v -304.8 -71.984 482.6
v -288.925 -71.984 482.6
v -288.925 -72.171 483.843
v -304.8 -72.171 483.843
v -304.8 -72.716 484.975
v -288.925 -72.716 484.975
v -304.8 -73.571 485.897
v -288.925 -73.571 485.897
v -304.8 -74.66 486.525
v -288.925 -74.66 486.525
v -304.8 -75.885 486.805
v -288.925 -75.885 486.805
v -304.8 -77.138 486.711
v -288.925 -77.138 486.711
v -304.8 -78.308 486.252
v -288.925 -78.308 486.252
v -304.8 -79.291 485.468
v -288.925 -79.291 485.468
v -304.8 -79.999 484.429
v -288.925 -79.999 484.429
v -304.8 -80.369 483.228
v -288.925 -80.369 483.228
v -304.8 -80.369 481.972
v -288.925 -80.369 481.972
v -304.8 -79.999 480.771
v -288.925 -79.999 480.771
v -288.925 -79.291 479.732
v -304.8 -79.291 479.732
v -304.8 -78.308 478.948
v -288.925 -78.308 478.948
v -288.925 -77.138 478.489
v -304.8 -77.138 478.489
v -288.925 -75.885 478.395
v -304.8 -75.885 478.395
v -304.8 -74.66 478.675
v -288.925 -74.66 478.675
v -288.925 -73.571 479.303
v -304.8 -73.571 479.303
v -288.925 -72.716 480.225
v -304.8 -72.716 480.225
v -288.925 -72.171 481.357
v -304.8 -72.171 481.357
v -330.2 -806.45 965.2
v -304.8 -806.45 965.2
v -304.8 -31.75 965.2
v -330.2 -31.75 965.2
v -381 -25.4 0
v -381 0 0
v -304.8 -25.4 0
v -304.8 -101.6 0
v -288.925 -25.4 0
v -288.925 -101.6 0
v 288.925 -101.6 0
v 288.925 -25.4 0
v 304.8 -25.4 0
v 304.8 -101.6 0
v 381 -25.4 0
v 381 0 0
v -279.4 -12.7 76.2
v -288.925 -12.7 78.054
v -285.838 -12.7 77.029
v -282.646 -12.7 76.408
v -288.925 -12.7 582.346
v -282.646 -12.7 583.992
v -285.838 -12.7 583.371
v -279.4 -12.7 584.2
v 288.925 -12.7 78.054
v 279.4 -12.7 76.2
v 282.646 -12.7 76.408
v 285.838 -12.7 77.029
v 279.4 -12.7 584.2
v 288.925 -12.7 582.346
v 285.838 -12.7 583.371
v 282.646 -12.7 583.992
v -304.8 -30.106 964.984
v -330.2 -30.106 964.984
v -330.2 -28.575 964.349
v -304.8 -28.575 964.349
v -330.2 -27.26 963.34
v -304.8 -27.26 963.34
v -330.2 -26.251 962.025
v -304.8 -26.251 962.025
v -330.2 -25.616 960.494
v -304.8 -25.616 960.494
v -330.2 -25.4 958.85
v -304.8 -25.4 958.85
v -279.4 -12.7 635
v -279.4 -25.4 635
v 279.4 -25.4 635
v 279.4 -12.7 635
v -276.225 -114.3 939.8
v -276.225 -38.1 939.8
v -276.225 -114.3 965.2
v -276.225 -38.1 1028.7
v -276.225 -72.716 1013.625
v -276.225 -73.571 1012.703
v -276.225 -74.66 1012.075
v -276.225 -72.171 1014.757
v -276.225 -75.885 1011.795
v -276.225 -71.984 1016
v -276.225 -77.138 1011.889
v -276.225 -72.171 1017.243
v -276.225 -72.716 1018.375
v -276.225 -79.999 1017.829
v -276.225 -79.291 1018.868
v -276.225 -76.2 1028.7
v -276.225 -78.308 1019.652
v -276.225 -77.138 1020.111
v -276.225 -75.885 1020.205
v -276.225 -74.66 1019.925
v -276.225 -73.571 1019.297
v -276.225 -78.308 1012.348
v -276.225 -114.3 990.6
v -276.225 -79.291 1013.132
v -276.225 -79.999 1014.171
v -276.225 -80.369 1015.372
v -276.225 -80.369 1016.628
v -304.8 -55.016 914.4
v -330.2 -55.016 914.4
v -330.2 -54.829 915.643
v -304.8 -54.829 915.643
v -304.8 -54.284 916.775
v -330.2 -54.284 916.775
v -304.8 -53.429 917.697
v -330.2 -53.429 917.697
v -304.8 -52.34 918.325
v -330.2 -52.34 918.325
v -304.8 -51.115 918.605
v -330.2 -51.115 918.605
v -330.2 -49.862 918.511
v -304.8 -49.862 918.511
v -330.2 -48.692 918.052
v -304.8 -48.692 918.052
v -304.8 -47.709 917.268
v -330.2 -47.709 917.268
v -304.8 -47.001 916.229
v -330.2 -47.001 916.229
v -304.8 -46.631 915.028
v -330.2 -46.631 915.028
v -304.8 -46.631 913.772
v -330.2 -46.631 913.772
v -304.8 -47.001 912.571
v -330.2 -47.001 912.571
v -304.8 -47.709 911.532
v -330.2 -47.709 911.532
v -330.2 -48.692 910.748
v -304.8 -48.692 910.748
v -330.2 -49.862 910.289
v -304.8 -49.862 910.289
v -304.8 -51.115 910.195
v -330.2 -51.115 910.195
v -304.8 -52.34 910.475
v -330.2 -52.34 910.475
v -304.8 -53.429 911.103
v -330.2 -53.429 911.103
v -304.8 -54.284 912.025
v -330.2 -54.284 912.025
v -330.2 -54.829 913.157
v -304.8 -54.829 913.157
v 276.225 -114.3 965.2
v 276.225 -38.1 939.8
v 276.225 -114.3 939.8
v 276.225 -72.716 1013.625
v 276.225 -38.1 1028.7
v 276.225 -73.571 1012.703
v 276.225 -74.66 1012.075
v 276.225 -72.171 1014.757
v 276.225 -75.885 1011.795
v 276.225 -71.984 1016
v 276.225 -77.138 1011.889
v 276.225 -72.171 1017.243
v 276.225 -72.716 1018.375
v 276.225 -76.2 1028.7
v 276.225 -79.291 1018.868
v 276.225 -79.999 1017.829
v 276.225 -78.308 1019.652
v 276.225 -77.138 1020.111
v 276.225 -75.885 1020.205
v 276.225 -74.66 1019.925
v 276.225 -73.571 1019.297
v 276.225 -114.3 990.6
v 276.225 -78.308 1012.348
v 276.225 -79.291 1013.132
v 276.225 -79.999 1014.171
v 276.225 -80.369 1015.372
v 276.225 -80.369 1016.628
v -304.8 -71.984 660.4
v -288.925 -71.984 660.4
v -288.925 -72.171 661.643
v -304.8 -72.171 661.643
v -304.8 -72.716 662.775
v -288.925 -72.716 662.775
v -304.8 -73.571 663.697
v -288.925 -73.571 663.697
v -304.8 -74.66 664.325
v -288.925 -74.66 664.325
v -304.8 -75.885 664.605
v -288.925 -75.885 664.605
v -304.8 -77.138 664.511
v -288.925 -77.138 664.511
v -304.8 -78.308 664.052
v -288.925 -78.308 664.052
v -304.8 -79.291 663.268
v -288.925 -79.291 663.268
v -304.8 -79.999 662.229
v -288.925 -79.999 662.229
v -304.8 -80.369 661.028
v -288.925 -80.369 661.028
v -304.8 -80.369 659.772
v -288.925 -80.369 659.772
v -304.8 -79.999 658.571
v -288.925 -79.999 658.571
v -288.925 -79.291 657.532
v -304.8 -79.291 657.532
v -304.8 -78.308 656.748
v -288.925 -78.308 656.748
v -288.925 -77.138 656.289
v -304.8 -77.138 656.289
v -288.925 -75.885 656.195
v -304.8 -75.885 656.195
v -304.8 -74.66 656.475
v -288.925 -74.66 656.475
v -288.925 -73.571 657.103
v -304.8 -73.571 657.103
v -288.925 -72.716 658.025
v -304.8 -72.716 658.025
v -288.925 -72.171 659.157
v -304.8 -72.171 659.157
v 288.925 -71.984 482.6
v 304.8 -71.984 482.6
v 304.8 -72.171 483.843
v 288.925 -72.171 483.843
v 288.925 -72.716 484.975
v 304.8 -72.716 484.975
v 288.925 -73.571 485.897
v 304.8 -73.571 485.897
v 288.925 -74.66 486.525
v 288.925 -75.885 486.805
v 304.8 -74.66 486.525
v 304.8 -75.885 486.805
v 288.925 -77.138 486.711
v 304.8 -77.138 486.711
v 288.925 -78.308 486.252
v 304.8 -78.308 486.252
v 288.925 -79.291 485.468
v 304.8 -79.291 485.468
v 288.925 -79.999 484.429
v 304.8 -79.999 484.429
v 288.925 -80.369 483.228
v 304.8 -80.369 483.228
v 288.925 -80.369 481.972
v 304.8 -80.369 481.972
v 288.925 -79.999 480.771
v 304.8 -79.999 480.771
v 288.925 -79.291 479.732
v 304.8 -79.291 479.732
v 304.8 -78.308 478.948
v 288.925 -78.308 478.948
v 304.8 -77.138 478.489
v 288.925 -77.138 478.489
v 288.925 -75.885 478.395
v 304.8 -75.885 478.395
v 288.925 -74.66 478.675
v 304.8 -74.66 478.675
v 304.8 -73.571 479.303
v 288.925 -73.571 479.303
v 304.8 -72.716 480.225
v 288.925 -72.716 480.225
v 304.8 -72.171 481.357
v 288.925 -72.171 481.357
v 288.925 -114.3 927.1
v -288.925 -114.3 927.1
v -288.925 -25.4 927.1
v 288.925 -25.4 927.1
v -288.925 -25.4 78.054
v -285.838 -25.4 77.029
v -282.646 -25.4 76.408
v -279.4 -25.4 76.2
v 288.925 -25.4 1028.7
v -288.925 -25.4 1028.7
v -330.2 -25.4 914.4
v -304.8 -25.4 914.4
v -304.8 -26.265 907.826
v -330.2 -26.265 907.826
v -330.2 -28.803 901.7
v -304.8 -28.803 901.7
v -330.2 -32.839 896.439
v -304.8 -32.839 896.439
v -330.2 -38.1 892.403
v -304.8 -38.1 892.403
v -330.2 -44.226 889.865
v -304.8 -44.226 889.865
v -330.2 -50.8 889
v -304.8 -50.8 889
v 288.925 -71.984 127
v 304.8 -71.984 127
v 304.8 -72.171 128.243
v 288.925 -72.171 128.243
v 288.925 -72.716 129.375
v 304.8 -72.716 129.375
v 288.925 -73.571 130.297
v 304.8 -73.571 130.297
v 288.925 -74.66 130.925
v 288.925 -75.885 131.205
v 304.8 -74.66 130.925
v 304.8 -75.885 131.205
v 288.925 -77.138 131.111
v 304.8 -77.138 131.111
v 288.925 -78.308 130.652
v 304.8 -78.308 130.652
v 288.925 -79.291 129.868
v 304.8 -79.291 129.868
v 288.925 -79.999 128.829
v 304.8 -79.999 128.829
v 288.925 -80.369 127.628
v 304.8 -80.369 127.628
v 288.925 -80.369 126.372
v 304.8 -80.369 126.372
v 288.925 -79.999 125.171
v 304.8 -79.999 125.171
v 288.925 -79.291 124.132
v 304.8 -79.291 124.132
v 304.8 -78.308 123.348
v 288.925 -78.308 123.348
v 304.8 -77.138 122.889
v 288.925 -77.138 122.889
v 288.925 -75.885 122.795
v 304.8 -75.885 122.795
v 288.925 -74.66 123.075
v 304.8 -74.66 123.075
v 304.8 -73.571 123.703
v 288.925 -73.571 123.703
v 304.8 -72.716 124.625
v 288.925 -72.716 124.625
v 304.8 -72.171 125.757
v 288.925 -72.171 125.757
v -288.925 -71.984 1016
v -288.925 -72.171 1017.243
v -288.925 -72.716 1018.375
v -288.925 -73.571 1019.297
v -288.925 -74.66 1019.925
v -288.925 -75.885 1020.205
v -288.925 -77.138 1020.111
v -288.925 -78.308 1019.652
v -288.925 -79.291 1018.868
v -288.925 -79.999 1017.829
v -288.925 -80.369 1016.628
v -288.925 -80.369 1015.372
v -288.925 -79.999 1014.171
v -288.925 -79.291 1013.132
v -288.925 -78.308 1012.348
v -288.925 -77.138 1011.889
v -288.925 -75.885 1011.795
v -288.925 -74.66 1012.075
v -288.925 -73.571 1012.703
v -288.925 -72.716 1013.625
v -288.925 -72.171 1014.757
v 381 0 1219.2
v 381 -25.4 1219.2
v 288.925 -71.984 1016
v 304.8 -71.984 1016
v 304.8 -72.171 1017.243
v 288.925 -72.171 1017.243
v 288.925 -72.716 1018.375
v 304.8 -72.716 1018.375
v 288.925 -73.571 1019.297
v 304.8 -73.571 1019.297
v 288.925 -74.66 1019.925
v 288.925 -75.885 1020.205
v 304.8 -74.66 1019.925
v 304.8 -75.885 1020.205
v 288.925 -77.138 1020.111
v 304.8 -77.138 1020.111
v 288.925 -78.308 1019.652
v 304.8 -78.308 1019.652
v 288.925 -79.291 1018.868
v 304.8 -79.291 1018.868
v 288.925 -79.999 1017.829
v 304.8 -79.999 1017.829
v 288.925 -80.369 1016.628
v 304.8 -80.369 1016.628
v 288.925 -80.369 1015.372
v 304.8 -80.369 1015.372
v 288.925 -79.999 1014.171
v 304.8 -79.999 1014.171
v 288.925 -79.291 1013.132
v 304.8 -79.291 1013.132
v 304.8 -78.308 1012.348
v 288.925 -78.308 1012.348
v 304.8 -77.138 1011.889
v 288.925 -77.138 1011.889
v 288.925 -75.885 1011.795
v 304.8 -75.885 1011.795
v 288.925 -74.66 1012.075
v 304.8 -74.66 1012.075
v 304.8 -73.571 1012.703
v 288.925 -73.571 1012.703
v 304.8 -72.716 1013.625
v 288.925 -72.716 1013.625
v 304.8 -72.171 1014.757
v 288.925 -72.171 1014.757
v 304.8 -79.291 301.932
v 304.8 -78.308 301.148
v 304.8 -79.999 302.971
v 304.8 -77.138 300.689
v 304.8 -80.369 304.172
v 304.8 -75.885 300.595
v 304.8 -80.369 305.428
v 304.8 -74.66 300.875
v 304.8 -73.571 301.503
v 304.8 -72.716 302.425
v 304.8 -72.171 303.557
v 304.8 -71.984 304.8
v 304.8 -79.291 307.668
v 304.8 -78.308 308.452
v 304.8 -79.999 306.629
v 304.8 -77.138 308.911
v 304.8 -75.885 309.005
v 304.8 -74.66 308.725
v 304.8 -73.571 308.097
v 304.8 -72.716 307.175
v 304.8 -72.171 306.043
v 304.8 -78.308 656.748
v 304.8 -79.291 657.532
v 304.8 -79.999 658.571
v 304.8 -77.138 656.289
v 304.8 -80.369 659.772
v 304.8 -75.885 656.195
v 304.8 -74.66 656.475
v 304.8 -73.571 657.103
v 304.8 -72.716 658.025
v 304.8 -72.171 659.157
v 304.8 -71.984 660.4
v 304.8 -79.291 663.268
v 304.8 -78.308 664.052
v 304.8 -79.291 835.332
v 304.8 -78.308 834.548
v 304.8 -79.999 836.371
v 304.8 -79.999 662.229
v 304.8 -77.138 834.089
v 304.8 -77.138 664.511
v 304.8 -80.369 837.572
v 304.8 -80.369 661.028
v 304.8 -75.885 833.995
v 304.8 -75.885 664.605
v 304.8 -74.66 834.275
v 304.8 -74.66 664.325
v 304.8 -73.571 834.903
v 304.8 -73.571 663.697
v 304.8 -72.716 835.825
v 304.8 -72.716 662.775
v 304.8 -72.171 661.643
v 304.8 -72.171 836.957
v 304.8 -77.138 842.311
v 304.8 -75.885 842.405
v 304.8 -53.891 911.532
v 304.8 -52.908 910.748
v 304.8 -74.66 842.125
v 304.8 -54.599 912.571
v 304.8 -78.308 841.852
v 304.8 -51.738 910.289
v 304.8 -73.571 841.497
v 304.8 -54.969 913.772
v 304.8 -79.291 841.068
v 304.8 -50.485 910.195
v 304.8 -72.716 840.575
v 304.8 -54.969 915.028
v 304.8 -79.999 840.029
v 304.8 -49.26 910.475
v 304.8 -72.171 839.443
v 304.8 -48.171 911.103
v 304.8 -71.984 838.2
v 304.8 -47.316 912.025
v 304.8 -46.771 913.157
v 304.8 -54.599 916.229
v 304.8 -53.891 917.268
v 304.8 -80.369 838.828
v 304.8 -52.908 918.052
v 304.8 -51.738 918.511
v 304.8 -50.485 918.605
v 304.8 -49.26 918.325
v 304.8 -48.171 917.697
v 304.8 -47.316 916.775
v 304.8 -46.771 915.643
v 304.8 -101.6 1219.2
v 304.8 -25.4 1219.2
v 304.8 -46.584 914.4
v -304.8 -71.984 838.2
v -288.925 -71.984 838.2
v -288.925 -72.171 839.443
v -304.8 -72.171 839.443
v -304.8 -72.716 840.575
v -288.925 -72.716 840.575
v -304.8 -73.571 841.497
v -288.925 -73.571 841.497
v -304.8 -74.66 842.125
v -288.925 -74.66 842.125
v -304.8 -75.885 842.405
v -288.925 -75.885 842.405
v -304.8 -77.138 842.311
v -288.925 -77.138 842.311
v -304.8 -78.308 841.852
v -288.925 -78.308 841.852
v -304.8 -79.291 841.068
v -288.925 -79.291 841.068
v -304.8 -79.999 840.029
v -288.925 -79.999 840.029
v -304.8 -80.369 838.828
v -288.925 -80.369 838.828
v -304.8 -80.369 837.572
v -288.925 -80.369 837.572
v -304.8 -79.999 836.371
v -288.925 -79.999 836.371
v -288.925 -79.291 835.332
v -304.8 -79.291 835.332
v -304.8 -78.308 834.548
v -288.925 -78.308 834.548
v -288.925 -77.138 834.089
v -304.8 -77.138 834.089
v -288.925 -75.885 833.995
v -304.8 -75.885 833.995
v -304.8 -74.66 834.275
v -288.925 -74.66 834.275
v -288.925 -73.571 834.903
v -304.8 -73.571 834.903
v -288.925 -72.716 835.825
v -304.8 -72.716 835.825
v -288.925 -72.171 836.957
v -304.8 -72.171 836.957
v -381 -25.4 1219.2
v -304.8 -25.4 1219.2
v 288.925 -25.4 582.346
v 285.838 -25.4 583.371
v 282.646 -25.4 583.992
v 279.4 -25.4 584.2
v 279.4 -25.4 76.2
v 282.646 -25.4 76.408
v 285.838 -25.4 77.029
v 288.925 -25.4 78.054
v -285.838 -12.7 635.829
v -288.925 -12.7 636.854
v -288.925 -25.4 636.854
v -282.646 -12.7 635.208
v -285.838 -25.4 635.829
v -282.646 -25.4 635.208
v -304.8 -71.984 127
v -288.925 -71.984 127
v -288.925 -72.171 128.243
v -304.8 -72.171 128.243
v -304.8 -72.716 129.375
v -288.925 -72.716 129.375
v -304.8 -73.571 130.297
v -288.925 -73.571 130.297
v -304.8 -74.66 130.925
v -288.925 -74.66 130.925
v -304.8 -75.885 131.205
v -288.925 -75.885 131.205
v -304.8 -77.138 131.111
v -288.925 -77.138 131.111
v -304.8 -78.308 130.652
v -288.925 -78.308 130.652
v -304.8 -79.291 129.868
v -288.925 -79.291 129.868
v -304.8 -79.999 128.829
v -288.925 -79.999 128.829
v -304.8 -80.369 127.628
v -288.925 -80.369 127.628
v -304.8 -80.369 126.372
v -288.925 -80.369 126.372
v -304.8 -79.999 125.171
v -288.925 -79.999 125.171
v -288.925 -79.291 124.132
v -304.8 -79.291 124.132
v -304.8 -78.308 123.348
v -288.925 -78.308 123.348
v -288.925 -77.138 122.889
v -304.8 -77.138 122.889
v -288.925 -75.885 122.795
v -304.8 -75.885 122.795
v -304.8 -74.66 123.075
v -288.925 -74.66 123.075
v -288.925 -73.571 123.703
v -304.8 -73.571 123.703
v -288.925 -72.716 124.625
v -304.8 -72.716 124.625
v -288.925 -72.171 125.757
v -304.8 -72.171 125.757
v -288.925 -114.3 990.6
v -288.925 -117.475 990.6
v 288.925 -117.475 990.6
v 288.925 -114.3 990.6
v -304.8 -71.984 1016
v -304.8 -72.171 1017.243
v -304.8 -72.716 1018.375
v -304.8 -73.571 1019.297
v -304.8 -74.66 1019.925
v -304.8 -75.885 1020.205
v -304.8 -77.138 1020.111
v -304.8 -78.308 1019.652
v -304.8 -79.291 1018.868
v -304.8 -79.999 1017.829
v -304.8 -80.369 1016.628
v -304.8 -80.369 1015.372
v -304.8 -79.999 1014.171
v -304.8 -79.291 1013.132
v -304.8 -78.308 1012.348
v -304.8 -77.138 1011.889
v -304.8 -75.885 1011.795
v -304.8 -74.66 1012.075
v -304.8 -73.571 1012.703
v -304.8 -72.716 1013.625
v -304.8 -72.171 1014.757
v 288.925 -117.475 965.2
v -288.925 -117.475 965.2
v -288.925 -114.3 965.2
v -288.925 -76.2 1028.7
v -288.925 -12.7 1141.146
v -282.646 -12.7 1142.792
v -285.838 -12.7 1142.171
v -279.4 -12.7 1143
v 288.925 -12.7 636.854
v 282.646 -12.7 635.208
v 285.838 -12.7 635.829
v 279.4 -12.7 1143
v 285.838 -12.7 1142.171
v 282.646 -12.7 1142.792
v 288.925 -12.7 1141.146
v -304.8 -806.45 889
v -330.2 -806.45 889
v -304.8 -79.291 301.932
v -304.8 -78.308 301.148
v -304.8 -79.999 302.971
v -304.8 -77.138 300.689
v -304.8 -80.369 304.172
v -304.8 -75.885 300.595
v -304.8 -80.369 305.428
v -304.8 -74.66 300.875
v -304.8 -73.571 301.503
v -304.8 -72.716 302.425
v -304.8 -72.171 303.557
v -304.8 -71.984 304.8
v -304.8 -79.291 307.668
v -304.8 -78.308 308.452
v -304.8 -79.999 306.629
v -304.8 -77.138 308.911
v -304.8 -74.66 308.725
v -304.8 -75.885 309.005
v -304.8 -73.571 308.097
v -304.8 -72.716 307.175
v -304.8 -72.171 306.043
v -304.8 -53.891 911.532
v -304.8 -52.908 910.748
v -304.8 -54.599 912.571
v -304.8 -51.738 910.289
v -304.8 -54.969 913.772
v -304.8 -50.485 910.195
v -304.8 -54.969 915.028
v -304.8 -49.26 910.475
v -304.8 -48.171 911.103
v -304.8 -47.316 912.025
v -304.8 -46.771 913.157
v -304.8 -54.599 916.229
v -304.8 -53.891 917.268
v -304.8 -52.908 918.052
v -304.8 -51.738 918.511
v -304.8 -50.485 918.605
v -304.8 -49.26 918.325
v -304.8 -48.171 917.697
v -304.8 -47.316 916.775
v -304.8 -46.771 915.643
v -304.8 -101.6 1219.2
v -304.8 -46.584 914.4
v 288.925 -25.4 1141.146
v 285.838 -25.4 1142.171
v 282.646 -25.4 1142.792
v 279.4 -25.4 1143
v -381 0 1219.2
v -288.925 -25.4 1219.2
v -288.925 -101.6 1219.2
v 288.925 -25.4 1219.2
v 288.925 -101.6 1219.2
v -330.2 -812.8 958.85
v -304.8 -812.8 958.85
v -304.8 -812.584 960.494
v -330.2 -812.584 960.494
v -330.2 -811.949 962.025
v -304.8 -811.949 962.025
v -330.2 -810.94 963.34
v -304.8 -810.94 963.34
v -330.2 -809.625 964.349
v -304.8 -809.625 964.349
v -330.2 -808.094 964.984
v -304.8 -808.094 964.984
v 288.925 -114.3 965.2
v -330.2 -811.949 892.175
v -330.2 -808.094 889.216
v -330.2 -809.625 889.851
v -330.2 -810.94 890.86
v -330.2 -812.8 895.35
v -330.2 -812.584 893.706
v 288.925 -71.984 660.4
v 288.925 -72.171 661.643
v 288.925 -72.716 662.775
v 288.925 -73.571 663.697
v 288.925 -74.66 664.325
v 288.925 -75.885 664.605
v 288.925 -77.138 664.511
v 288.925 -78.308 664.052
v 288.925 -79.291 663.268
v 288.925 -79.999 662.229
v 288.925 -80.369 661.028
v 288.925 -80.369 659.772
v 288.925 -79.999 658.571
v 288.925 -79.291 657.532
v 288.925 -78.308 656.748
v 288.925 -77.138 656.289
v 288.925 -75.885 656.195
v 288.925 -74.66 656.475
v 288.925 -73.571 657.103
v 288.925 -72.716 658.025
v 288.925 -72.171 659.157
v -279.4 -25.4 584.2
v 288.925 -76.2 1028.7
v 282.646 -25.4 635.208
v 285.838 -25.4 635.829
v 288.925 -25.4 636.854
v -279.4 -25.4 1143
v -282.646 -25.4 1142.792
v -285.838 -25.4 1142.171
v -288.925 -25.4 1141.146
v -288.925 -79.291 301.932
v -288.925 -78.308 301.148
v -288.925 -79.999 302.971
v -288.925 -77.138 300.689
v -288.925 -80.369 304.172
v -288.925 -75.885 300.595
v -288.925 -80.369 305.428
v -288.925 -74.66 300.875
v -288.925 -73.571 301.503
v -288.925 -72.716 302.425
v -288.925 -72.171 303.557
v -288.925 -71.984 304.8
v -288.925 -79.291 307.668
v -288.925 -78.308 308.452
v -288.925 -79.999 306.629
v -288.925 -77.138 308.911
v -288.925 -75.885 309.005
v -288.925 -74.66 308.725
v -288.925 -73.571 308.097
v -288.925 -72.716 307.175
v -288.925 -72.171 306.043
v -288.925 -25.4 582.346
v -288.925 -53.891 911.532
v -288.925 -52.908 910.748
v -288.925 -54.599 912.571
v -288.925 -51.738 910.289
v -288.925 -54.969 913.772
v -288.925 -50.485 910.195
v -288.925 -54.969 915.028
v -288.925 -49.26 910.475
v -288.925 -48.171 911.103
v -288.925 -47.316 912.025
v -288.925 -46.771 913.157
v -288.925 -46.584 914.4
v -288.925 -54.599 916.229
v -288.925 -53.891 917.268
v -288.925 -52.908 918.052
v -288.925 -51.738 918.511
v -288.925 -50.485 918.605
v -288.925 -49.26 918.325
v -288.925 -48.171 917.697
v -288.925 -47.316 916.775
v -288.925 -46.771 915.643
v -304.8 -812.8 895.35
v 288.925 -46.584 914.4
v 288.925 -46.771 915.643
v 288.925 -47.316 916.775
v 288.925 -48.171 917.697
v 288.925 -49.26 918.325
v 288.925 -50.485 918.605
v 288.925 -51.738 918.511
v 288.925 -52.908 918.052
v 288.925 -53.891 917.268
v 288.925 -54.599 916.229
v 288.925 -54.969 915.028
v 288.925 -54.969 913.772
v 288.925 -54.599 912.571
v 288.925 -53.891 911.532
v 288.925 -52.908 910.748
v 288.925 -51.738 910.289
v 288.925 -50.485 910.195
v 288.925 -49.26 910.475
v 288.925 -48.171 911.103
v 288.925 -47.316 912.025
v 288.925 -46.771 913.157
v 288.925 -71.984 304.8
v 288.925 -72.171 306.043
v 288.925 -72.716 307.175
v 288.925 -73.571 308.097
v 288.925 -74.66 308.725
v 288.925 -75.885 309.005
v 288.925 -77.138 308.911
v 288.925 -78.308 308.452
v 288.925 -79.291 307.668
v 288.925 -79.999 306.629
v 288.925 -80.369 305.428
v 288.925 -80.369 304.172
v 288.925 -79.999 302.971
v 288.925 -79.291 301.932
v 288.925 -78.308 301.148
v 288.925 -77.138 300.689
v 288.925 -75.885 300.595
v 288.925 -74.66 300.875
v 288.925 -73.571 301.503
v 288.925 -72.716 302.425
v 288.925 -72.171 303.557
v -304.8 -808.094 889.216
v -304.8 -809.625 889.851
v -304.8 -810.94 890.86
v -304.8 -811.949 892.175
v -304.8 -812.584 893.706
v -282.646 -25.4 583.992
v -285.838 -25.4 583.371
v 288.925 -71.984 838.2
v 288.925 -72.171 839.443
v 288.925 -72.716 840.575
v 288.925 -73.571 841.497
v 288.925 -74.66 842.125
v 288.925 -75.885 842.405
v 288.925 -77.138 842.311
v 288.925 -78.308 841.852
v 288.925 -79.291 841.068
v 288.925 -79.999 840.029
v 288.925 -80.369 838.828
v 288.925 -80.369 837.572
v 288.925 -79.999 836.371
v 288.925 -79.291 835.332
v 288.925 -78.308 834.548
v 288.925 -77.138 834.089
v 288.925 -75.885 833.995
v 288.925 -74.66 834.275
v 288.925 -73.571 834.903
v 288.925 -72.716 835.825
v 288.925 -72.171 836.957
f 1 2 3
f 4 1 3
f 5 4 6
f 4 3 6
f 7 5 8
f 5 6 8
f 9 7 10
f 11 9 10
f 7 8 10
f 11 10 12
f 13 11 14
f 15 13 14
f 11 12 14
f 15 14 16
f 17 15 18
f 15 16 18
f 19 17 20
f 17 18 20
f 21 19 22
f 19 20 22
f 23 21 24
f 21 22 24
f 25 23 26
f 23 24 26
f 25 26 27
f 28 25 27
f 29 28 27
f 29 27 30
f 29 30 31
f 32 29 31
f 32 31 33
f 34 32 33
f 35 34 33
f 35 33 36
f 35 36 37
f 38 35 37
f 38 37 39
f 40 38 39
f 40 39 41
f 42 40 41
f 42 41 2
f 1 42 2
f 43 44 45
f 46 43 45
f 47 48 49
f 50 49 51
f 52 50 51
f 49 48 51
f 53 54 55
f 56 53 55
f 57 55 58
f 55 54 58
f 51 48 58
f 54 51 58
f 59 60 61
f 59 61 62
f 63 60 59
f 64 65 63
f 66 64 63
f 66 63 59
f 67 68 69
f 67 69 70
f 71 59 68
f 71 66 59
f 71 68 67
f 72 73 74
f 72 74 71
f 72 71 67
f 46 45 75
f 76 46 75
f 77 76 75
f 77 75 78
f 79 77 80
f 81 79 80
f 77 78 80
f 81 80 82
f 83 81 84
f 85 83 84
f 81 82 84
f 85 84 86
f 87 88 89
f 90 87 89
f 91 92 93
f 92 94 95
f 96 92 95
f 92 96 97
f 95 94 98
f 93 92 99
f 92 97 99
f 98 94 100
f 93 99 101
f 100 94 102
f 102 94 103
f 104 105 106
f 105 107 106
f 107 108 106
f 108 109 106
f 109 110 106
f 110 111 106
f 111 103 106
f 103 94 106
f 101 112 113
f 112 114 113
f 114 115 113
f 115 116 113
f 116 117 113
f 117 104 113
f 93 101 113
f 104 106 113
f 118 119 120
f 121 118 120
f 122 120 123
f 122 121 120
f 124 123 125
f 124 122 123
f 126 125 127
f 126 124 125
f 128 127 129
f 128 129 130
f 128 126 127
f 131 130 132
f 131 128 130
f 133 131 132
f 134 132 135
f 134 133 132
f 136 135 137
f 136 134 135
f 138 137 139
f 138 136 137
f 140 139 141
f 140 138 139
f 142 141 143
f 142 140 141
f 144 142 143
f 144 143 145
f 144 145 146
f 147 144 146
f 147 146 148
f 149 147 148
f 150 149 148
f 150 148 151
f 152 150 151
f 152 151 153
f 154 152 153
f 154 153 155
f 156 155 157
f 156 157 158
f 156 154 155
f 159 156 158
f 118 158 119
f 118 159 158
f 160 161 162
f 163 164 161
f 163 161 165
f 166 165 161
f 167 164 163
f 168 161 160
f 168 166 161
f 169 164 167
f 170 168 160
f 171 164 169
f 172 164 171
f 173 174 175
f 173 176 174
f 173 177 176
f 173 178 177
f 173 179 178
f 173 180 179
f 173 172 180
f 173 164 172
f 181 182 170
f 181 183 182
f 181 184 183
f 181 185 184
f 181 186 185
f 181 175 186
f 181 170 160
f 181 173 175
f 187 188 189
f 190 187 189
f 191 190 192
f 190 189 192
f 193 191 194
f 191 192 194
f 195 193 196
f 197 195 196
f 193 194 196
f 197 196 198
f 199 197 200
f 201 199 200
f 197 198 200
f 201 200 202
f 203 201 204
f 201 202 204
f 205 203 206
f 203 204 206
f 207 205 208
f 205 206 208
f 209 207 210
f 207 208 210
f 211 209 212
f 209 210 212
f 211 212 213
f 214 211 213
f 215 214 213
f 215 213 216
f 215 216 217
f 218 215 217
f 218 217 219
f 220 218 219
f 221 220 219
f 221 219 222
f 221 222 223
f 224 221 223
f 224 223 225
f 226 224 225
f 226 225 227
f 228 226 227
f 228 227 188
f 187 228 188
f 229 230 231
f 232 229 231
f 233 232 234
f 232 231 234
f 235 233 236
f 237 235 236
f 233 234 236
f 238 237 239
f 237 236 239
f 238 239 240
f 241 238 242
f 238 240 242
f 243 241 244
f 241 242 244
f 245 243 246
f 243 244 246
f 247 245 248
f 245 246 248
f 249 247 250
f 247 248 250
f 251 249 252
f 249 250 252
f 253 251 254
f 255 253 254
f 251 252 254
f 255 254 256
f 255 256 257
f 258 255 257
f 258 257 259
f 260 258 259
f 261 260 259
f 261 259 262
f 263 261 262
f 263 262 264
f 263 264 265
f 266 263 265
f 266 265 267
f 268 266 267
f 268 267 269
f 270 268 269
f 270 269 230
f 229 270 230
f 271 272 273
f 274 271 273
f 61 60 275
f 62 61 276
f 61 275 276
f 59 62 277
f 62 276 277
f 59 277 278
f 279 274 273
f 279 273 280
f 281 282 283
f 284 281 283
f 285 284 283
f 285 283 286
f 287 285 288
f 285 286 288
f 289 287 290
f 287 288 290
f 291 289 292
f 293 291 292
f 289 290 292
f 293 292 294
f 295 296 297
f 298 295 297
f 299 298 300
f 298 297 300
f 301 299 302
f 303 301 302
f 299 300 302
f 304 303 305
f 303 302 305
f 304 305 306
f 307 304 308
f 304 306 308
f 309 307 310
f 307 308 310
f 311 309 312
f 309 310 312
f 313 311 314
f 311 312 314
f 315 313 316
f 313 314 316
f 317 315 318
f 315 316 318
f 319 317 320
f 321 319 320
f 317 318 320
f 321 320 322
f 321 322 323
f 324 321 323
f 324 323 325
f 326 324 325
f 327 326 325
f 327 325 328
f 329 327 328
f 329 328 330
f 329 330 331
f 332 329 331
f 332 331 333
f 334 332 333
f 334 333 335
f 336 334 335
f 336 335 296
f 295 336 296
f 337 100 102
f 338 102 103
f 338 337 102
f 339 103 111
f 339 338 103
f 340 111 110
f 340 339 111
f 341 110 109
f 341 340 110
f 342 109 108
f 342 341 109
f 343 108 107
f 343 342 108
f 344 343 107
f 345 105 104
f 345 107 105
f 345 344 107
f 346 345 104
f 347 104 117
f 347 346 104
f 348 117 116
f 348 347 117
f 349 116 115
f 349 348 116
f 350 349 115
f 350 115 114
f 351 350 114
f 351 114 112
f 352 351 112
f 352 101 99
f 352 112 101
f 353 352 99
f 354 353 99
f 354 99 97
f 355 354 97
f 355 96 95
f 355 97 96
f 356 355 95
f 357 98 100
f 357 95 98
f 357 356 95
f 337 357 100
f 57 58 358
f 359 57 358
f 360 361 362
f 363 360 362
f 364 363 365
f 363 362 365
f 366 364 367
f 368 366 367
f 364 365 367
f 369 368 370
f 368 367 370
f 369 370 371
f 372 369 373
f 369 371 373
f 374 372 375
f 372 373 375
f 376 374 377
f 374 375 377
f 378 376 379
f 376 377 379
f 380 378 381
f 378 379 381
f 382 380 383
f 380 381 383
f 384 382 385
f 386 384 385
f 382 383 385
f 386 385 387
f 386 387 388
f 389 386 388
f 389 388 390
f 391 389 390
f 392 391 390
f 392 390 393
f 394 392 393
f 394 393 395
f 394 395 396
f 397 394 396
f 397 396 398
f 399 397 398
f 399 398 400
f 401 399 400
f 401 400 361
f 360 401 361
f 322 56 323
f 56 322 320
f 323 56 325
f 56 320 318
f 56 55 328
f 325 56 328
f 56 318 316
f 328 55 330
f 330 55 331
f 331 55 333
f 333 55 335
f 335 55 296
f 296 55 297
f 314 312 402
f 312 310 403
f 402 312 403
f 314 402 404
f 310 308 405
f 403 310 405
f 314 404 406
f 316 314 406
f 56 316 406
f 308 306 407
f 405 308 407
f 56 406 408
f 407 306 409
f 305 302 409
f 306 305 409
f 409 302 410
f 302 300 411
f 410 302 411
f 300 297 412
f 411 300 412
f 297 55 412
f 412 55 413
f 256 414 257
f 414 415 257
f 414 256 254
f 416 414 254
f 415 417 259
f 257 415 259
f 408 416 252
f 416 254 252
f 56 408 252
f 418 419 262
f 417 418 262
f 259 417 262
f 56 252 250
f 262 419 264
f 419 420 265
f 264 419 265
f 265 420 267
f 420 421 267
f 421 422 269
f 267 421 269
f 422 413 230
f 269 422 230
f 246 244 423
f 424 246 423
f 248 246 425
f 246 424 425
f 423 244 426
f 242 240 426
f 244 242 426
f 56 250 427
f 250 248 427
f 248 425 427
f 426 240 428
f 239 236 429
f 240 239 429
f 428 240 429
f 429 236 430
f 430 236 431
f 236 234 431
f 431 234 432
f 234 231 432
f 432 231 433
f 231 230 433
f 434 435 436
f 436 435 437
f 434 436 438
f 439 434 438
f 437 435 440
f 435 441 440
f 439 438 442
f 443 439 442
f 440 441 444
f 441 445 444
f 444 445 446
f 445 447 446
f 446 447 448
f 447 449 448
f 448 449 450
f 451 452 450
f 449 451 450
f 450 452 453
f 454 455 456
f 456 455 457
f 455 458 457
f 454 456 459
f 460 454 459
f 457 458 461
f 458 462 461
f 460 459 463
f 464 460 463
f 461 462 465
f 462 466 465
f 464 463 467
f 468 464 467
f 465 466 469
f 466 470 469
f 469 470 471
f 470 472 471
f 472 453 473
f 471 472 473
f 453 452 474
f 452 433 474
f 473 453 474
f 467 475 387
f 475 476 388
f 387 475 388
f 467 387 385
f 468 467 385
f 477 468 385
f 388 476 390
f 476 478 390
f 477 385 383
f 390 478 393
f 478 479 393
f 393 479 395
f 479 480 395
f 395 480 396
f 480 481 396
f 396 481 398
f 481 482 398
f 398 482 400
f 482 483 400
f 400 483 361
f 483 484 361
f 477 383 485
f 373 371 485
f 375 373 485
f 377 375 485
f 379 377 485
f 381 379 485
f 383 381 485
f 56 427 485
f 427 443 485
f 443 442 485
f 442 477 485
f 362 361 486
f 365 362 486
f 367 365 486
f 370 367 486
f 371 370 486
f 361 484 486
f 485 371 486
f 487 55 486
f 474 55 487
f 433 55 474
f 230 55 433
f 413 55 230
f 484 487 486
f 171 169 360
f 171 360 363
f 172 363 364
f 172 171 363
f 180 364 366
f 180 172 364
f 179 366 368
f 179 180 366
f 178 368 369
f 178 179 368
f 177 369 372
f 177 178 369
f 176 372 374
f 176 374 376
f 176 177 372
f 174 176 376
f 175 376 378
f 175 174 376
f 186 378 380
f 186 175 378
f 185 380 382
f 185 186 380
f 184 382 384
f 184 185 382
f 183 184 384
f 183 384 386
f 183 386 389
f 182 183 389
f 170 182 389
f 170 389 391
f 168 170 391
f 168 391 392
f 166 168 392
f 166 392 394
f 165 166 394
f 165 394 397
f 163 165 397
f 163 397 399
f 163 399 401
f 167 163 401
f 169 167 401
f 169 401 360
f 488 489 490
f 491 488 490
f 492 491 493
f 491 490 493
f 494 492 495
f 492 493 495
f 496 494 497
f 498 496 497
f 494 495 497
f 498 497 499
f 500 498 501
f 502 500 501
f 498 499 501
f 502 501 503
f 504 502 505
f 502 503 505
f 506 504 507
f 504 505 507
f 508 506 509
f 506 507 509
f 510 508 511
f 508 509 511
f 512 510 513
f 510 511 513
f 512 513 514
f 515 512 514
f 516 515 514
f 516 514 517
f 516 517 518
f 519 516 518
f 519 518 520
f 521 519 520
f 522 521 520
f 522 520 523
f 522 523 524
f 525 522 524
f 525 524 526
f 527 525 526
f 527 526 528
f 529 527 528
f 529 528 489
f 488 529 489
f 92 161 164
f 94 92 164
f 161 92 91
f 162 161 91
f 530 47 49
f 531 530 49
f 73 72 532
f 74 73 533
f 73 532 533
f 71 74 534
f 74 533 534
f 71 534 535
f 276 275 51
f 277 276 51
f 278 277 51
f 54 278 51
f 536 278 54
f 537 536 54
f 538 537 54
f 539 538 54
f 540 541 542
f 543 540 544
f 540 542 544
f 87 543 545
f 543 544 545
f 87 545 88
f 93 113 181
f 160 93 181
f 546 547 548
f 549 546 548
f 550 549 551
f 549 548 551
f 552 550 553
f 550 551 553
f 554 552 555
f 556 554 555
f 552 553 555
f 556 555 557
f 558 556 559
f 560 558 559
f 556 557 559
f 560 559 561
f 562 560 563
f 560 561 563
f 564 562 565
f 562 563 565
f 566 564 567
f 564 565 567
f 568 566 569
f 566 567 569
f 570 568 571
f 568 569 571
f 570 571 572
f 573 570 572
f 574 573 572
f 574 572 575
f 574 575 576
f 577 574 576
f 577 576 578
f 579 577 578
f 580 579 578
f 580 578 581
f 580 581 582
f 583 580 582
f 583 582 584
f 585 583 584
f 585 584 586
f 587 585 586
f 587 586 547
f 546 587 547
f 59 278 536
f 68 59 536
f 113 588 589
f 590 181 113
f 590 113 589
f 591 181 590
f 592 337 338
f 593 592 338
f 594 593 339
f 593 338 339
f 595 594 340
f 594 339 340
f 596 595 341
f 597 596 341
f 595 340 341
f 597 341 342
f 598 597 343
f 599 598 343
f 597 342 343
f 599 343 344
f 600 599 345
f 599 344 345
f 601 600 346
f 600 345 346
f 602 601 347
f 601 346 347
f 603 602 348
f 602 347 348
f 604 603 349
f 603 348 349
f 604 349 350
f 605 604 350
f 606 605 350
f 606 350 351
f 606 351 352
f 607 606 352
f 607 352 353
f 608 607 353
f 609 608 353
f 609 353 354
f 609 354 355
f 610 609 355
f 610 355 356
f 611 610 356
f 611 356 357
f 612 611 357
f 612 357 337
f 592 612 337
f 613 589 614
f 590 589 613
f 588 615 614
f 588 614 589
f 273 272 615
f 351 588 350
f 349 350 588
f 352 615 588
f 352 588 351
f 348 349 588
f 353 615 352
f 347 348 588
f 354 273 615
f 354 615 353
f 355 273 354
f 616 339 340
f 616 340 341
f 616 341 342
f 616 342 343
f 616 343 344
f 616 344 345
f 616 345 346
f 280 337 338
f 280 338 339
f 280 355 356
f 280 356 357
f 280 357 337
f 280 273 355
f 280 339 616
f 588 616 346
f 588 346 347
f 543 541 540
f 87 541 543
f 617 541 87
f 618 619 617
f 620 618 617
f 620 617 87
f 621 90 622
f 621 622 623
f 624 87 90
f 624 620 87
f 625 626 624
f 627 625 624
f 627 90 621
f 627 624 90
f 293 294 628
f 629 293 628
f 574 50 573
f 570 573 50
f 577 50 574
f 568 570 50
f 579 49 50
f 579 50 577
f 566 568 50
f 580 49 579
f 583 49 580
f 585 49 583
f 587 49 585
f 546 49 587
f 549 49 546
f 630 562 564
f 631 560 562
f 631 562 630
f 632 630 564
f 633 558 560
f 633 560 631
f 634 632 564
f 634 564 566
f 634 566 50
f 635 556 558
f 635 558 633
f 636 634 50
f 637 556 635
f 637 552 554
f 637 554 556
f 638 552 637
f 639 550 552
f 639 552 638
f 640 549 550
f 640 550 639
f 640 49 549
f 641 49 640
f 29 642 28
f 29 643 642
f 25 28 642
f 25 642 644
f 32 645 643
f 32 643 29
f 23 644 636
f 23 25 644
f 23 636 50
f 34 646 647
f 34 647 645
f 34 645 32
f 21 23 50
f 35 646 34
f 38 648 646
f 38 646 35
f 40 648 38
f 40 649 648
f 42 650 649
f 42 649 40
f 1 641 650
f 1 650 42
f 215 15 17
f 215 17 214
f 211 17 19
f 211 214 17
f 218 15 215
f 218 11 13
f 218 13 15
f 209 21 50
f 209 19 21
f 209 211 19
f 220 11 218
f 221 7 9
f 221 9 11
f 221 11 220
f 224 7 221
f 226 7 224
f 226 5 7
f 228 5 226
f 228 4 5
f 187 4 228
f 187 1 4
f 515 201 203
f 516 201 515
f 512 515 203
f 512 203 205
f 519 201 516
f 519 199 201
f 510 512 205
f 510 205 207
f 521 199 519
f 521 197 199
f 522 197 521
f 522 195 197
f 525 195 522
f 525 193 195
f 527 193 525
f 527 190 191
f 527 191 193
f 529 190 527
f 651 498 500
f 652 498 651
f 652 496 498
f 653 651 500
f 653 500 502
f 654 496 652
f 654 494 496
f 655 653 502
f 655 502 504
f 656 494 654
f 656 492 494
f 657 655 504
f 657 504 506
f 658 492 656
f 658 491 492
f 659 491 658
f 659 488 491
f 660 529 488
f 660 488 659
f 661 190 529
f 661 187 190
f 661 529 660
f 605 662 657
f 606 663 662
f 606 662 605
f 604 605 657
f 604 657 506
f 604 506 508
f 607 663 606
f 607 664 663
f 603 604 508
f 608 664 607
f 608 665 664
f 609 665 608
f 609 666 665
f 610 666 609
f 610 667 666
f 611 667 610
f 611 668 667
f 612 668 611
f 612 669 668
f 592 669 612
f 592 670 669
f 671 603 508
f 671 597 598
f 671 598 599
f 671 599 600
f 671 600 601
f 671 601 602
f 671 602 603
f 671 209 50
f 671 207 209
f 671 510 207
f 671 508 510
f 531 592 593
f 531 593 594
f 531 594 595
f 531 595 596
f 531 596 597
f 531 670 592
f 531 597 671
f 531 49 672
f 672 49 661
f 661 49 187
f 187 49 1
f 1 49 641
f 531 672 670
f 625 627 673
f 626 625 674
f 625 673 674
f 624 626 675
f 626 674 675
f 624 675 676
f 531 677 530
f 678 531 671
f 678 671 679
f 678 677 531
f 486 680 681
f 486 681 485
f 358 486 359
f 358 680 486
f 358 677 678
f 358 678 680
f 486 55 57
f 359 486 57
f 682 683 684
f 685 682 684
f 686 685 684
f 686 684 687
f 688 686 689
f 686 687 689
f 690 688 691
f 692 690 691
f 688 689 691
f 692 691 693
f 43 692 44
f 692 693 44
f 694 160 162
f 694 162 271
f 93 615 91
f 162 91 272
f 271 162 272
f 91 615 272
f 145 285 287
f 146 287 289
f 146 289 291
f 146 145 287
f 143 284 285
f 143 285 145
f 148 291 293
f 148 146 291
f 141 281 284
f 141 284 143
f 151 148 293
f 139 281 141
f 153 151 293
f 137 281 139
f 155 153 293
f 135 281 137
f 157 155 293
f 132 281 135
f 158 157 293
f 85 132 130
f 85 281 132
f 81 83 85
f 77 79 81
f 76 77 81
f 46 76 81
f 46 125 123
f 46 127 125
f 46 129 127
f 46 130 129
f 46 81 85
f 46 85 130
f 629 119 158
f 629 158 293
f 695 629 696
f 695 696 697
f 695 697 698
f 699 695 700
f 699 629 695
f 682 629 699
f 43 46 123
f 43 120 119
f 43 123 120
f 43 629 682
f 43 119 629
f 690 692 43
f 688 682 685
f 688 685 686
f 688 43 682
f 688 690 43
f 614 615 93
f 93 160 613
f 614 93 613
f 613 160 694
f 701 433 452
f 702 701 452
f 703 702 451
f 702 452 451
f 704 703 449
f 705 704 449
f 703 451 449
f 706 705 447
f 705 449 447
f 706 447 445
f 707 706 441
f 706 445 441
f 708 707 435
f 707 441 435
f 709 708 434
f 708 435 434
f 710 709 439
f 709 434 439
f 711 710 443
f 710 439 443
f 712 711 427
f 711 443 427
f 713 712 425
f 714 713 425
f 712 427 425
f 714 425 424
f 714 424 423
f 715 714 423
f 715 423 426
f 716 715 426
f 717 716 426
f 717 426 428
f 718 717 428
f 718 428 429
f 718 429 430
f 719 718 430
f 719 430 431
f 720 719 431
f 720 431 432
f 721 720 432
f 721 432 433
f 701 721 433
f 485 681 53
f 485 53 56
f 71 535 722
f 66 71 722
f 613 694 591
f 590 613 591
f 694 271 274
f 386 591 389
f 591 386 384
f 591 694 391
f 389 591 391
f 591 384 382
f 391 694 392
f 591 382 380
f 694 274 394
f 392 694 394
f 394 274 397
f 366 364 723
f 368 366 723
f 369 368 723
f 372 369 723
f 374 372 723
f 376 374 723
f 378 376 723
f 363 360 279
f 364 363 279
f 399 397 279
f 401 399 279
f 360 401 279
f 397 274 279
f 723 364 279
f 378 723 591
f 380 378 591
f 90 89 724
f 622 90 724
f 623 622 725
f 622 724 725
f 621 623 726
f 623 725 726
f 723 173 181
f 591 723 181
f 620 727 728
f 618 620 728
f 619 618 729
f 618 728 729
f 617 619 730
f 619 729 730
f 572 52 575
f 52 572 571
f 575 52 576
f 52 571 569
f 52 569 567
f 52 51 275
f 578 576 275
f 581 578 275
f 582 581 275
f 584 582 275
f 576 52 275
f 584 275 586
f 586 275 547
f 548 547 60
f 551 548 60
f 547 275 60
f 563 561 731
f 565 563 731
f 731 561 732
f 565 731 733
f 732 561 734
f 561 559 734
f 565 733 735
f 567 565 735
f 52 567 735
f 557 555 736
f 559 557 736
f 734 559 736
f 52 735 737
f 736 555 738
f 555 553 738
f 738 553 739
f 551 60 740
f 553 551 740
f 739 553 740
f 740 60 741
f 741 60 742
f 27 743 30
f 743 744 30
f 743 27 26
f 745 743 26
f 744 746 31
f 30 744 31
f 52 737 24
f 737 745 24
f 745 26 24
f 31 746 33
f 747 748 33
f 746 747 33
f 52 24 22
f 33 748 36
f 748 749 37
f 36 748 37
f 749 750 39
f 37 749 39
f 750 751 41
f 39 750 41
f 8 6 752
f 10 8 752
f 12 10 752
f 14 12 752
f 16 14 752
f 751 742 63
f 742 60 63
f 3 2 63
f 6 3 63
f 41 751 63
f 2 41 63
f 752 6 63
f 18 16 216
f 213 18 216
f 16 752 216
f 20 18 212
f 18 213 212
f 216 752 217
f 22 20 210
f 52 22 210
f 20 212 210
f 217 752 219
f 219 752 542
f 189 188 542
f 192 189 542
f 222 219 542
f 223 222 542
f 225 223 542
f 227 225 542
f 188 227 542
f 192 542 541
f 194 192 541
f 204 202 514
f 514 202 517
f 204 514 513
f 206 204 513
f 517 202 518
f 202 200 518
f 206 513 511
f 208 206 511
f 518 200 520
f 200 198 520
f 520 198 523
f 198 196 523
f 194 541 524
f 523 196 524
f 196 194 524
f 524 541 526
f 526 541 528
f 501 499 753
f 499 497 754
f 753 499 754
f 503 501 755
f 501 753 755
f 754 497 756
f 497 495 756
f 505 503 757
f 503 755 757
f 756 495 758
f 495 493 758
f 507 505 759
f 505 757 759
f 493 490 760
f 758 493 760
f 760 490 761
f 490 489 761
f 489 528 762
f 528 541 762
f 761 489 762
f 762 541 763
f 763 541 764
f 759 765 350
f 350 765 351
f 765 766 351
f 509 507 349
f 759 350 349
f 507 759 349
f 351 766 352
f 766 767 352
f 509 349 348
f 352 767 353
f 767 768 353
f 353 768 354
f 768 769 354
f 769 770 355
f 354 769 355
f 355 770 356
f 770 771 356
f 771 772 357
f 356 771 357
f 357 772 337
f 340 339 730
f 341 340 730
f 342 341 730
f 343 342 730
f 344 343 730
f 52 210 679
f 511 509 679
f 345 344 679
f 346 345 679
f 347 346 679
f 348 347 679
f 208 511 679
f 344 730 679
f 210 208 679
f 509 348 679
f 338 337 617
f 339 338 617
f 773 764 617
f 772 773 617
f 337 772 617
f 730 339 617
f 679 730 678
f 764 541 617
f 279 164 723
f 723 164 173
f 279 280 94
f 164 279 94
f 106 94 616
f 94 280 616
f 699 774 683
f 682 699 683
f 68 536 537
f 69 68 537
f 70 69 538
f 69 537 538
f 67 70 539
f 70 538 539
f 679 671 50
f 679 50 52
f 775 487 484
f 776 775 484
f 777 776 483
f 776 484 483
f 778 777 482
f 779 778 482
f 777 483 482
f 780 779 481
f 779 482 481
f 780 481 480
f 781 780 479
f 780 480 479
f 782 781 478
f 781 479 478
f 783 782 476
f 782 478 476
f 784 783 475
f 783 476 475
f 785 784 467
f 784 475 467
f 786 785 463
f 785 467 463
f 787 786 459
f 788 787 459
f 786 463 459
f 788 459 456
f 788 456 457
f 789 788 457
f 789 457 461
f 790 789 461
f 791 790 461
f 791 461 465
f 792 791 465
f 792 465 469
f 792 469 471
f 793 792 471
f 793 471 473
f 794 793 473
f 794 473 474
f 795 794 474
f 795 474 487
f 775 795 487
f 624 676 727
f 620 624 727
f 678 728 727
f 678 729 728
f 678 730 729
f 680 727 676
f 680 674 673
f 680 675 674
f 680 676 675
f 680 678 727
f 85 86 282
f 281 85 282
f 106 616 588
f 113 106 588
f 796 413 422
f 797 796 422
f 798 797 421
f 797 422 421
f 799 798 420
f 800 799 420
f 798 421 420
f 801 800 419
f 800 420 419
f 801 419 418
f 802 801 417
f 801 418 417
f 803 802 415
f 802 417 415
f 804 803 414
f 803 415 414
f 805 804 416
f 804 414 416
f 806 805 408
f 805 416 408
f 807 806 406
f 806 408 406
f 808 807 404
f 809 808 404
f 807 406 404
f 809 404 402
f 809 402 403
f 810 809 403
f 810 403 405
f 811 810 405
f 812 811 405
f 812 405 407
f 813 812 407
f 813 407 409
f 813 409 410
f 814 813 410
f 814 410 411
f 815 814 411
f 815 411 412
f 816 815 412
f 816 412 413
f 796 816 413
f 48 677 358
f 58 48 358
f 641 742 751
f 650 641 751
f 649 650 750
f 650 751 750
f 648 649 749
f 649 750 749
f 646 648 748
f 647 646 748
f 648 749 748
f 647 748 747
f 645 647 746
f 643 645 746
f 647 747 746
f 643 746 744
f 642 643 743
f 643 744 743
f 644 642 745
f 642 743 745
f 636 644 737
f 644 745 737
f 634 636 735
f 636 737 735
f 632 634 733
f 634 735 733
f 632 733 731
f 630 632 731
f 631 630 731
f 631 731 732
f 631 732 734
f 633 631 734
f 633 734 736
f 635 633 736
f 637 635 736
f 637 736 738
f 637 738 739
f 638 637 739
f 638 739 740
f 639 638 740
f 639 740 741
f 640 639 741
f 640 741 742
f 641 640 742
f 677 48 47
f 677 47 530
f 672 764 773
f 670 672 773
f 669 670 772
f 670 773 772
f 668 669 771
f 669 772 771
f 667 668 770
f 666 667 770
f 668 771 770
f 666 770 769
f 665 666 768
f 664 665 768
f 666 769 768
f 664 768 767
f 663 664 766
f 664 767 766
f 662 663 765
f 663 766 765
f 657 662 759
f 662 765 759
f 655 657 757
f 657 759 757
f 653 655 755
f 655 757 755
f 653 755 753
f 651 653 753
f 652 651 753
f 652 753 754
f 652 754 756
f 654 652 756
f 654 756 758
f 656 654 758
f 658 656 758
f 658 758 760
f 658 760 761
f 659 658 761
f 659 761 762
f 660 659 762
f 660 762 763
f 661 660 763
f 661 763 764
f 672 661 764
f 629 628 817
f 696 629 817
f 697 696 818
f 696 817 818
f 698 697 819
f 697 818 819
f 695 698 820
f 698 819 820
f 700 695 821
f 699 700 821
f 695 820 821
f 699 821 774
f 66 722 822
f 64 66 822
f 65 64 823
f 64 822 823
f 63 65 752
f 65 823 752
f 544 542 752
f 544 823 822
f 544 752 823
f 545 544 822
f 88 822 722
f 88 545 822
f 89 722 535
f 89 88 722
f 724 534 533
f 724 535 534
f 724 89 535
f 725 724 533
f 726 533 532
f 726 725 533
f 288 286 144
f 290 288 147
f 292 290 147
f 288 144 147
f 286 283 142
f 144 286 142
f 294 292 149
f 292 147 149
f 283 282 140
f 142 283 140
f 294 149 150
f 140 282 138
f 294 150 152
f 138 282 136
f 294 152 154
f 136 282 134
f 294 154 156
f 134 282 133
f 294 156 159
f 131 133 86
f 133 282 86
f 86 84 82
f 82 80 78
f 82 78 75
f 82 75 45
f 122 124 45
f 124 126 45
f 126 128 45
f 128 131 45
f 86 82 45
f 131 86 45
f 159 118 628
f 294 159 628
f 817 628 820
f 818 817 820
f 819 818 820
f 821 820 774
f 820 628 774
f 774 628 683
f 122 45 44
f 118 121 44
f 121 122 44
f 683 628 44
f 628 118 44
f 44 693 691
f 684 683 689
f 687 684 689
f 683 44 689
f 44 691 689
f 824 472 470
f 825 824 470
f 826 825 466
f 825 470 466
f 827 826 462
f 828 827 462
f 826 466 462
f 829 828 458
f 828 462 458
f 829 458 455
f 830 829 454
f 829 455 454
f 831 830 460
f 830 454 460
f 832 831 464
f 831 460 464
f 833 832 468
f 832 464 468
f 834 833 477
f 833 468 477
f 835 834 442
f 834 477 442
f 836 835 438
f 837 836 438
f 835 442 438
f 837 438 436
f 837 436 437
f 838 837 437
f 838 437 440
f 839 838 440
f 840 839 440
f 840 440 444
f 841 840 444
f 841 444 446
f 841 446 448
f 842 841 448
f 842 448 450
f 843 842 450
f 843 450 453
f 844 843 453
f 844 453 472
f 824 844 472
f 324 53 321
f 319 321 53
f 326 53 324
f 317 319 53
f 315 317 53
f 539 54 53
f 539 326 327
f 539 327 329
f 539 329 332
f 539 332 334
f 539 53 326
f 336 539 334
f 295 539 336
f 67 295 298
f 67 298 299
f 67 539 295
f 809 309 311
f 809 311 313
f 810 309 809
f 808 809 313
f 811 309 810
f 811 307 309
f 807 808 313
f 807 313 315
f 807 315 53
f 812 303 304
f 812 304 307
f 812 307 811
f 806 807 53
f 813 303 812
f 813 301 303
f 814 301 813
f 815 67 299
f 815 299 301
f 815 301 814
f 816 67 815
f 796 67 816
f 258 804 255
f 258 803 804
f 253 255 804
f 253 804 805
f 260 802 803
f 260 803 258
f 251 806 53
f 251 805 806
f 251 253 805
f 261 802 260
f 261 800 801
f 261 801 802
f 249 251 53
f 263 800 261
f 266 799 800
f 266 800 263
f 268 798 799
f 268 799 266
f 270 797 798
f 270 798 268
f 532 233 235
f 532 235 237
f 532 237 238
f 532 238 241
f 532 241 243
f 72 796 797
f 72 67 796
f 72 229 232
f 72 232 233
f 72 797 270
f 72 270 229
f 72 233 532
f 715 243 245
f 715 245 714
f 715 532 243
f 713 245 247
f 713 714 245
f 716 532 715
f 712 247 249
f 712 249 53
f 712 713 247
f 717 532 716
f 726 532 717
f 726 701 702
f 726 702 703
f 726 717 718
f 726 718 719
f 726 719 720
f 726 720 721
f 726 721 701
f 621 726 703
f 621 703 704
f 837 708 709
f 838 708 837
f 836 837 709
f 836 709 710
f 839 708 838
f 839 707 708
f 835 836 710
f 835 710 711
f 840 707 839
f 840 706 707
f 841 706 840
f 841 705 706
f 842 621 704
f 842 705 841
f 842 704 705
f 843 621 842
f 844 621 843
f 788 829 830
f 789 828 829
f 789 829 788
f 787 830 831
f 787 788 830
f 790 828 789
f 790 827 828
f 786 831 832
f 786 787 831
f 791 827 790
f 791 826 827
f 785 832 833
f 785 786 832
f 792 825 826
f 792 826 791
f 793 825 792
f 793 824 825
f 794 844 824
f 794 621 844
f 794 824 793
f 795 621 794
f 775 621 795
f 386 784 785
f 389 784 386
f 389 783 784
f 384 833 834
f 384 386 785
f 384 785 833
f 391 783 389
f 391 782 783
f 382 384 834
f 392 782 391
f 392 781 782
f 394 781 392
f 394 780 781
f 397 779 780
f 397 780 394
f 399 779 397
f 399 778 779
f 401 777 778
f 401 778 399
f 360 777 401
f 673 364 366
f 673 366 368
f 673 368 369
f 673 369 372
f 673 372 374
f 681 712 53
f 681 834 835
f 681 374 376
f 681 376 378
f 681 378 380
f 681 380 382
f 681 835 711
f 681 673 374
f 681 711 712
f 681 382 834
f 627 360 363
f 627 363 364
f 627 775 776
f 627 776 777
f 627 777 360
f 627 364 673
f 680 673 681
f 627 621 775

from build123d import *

# Parameters (mm, degrees)
F0_W      = 762
F0_H      = 1219.2
F1_DEPTH  = 25.4
F3_DEPTH  = 12.7
F4_W      = 15.875
F4_H      = 1219.2
F5_DEPTH  = 88.9
F7_D      = 8.4328
F8_R      = 4.2164
F9_DEPTH  = 577.85
F11_W     = 76.2
F11_H     = 88.9
F12_DEPTH = 552.45
F13_R     = 4.2164
F14_DEPTH = 25.4
F15_W     = 577.85
F15_H     = 25.4
F16_DEPTH = 3.175


with BuildPart() as f1:
    # F0 (on Front) → F1 (new body)
    with BuildSketch(Plane.XZ):
        with Locations((0, 609.6)):
            Rectangle(F0_W, F0_H)
    extrude(amount=F1_DEPTH)

    # F2 (on face) → F3 (cut)
    with BuildSketch(Plane.XZ.offset(25.4)):
        with BuildLine():
            Line((279.4, 1143), (-279.4, 1143))
            ThreePointArc((-279.4, 1143), (-297.3605122421, 1135.5605122421), (-304.8, 1117.6))
            Line((-304.8, 1117.6), (-304.8, 660.4))
            ThreePointArc((-304.8, 660.4), (-297.3605122421, 642.4394877579), (-279.4, 635))
            Line((-279.4, 635), (279.4, 635))
            ThreePointArc((279.4, 635), (297.3605122421, 642.4394877579), (304.8, 660.4))
            Line((304.8, 660.4), (304.8, 1117.6))
            ThreePointArc((304.8, 1117.6), (297.3605122421, 1135.5605122421), (279.4, 1143))
        make_face()
        with BuildLine():
            ThreePointArc((-304.8, 101.6), (-297.3605122421, 83.6394877579), (-279.4, 76.2))
            Line((-279.4, 76.2), (279.4, 76.2))
            ThreePointArc((279.4, 76.2), (297.3605122421, 83.6394877579), (304.8, 101.6))
            Line((304.8, 101.6), (304.8, 558.8))
            ThreePointArc((304.8, 558.8), (297.3605122421, 576.7605122421), (279.4, 584.2))
            Line((279.4, 584.2), (-279.4, 584.2))
            ThreePointArc((-279.4, 584.2), (-297.3605122421, 576.7605122421), (-304.8, 558.8))
            Line((-304.8, 558.8), (-304.8, 101.6))
        make_face()
    extrude(amount=-F3_DEPTH, mode=Mode.SUBTRACT)

    # F4 (on face) → F5 (join)
    with BuildSketch(Plane.XZ.offset(12.7)):
        with Locations((-296.8625, 609.6)):
            Rectangle(F4_W, F4_H)
        with Locations((296.8625, 609.6)):
            Rectangle(F4_W, F4_H)
    extrude(amount=F5_DEPTH)

    # F7 (through all)
    with Locations(Plane(origin=(-304.8, 0, 0), x_dir=(0, -1, 0), z_dir=(-1, 0, 0))):
        with Locations((76.2, 1016), (76.2, 838.2), (76.2, 660.4), (76.2, 482.6), (76.2, 304.8), (76.2, 127), (50.8, 914.4)):
            Hole(F7_D / 2)


with BuildPart() as f9:
    # F8 (on face) → F9 (new body)
    with BuildSketch(Plane.YZ.offset(-288.925)):
        Polygon((-25.4, 1028.7), (-76.2, 1028.7), (-114.3, 990.6), (-114.3, 927.1), (-25.4, 927.1), align=None)
        with Locations((-76.2, 1016)):
            Circle(F8_R, mode=Mode.SUBTRACT)
    extrude(amount=F9_DEPTH)

    # F11 (on offset) → F12 (cut)
    with BuildSketch(Plane(origin=(-276.225, 0, 0), x_dir=(0, -1, 0), z_dir=(-1, 0, 0))):
        with Locations((76.2, 984.25)):
            Rectangle(F11_W, F11_H)
    extrude(amount=-F12_DEPTH, mode=Mode.SUBTRACT)

    # F15 (on face) → F16 (join)
    with BuildSketch(Plane.XZ.offset(114.3)):
        with Locations((0, 977.9)):
            Rectangle(F15_W, F15_H)
    extrude(amount=F16_DEPTH)


with BuildPart() as f14:
    # F13 (on face) → F14 (new body)
    with BuildSketch(Plane(origin=(-304.8, 0, 0), x_dir=(0, -1, 0), z_dir=(-1, 0, 0))):
        with BuildLine():
            Line((806.45, 965.2), (31.75, 965.2))
            ThreePointArc((31.75, 965.2), (27.2598719395, 963.3401280605), (25.4, 958.85))
            Line((25.4, 958.85), (25.4, 914.4))
            ThreePointArc((25.4, 914.4), (32.8394877579, 896.4394877579), (50.8, 889))
            Line((50.8, 889), (806.45, 889))
            ThreePointArc((806.45, 889), (810.9401280605, 890.8598719395), (812.8, 895.35))
            Line((812.8, 895.35), (812.8, 958.85))
            ThreePointArc((812.8, 958.85), (810.9401280605, 963.3401280605), (806.45, 965.2))
        make_face()
        with Locations((50.8, 914.4)):
            Circle(F13_R, mode=Mode.SUBTRACT)
    extrude(amount=F14_DEPTH)


solid = Compound([f1.part, f9.part, f14.part])
